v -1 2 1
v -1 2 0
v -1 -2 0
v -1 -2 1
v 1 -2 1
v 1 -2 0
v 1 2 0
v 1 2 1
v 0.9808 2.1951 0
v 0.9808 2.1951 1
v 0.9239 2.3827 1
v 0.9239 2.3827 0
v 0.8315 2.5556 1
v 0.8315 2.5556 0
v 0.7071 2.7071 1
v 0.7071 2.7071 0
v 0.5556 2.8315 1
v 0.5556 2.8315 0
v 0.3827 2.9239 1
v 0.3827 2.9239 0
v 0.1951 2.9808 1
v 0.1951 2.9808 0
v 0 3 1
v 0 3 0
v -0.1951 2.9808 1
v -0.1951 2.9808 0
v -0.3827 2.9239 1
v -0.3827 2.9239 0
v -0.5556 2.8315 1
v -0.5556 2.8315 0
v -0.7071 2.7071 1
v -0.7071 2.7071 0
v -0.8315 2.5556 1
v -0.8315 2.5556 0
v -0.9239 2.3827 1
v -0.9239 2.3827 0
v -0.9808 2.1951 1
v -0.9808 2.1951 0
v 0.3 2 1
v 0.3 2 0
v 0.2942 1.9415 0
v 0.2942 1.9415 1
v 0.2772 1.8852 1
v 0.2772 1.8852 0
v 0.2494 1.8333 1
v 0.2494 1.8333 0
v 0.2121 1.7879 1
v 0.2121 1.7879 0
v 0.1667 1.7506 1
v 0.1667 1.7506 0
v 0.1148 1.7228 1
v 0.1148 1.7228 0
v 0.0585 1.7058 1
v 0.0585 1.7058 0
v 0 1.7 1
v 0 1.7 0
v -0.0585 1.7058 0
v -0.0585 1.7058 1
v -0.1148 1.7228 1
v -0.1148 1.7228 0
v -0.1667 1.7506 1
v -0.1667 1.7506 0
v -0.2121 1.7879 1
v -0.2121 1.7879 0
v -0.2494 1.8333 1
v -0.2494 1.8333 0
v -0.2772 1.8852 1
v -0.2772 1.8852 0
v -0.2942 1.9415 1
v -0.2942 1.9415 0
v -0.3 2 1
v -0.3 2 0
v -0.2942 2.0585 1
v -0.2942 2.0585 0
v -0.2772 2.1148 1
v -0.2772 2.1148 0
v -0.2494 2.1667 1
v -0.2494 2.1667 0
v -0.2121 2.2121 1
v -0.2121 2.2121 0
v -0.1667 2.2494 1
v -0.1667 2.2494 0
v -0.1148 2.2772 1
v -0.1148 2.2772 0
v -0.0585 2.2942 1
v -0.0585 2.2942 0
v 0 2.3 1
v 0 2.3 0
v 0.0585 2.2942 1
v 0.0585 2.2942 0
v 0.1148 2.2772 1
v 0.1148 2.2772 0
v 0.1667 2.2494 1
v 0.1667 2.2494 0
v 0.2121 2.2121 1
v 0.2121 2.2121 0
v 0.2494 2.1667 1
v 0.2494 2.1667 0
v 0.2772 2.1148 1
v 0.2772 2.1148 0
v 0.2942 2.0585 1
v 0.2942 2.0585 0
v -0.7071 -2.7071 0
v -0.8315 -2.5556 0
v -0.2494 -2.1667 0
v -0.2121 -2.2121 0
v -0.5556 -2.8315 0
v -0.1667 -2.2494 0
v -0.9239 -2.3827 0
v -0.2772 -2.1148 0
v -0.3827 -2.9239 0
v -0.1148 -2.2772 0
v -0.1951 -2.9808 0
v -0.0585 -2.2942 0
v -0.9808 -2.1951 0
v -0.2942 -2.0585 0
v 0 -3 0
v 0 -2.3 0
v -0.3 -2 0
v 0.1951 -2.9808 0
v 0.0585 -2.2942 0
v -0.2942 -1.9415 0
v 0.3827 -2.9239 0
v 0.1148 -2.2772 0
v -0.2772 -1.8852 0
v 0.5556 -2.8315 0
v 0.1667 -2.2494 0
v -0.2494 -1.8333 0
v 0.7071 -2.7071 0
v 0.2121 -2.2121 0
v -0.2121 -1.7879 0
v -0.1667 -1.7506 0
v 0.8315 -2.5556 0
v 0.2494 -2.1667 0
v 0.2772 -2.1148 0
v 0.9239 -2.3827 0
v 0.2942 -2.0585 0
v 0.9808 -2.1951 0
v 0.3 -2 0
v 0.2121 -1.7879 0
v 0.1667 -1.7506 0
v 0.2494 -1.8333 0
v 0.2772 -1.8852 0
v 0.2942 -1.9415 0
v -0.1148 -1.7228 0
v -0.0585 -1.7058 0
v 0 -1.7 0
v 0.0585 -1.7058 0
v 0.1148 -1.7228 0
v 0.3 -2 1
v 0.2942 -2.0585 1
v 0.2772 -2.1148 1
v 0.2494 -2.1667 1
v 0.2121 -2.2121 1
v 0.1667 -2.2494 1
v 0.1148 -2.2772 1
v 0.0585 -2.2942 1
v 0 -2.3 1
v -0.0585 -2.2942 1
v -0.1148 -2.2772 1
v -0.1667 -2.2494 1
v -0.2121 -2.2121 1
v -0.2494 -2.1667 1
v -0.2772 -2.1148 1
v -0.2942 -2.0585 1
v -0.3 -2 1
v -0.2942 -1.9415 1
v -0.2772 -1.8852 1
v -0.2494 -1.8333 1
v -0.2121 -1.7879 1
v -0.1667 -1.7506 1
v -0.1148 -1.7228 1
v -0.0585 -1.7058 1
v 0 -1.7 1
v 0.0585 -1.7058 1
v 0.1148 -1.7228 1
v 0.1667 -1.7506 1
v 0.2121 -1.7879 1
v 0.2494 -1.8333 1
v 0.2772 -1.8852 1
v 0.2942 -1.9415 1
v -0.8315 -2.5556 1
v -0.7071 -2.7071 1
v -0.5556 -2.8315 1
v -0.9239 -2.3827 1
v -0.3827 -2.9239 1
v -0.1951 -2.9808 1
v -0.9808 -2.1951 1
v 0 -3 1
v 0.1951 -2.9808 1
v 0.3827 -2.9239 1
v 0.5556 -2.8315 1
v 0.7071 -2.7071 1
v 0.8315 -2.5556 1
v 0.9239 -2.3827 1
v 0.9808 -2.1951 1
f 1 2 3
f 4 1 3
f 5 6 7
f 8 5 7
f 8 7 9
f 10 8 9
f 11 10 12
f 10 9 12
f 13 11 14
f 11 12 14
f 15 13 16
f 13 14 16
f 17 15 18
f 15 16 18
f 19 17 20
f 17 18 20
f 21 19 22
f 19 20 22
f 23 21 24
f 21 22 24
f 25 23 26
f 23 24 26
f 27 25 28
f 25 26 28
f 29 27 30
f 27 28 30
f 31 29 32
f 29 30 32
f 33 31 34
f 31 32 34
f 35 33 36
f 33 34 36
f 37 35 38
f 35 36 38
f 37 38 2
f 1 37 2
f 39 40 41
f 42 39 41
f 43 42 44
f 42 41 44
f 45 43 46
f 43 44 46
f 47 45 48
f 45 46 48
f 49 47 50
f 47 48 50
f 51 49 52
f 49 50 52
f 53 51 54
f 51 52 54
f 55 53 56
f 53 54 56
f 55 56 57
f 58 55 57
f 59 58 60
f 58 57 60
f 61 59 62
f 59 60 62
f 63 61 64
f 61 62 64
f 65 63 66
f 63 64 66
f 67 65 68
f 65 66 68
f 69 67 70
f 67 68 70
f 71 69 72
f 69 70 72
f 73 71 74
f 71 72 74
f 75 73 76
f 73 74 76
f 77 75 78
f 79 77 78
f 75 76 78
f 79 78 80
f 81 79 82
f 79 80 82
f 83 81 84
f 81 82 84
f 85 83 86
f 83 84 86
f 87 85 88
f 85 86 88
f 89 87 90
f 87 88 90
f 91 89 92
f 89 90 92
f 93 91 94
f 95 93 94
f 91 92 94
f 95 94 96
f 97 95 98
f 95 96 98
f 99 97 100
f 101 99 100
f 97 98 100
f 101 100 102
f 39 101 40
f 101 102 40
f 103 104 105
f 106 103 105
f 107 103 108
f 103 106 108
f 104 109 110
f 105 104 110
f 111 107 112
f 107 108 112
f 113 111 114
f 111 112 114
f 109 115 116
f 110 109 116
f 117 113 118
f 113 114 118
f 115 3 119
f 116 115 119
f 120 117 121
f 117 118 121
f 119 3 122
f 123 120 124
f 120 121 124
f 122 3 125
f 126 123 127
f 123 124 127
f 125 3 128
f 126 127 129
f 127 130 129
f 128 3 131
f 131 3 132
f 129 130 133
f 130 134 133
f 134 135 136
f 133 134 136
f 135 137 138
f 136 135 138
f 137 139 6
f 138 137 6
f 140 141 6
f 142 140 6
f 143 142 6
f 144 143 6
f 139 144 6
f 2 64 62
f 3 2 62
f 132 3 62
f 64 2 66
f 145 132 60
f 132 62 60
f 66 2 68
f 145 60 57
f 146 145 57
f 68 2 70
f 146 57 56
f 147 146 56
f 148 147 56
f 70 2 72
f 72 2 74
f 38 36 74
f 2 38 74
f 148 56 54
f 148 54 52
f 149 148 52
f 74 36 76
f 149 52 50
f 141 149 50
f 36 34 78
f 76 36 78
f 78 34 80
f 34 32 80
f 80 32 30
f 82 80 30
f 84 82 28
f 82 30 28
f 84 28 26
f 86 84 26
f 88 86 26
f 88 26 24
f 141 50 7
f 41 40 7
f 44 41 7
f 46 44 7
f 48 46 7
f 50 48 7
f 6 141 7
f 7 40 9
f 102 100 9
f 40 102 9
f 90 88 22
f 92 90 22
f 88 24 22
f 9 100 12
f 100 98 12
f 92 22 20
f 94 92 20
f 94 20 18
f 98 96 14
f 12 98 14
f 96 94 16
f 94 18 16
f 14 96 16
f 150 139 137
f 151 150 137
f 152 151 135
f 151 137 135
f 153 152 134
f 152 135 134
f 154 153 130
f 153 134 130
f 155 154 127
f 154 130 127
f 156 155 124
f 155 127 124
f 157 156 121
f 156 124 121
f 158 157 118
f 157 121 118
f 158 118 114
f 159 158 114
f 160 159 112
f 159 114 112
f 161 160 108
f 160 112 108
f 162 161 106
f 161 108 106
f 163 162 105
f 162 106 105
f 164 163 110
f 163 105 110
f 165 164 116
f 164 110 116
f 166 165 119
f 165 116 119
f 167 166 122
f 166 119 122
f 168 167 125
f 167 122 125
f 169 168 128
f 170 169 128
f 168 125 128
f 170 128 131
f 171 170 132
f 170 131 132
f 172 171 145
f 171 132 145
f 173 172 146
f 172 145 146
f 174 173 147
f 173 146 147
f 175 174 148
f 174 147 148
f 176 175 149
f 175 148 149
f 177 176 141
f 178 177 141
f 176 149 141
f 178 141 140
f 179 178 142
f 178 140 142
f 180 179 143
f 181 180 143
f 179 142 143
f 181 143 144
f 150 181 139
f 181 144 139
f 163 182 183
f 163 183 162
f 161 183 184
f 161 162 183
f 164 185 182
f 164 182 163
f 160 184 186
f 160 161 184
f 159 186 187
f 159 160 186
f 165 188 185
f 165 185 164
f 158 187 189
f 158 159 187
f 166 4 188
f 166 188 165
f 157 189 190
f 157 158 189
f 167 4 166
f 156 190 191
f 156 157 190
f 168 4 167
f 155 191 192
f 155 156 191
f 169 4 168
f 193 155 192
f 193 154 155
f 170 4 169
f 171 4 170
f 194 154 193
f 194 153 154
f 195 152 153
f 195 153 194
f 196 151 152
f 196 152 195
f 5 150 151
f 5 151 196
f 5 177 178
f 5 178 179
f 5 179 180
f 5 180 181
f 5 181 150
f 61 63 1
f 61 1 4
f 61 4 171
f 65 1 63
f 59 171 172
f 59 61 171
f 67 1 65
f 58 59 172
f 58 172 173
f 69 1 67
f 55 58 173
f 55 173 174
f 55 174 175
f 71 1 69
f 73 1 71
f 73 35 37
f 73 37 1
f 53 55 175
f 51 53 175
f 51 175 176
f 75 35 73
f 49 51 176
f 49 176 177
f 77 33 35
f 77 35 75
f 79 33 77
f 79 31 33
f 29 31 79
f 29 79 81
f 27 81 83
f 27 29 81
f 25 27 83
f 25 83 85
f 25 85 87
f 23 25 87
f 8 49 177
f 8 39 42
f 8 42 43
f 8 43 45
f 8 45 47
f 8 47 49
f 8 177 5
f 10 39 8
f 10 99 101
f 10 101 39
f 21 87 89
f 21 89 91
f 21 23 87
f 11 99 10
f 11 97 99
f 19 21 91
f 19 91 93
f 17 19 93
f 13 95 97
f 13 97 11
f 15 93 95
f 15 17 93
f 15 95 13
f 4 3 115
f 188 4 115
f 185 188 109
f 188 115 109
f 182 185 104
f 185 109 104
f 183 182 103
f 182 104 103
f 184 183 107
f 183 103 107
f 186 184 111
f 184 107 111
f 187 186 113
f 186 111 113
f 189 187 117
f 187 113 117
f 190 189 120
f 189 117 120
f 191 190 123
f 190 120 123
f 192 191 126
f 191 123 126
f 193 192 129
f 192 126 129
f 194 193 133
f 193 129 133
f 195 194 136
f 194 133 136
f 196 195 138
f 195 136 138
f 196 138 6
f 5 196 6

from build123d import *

# Parameters (mm, degrees)
EXTRUDE_1_DEPTH = 1


with BuildPart() as part:
    # 草图1 → 凸台-拉伸1 (new body)
    with BuildSketch(Plane.XY):
        with BuildLine():
            ThreePointArc((-0.3, 2), (0, 2.3), (0.3, 2))
            Line((0.3, 2), (1, 2))
            ThreePointArc((1, 2), (0, 3), (-1, 2))
            Line((-1, 2), (-0.3, 2))
        make_face()
        with BuildLine():
            Line((1, 2), (0.3, 2))
            ThreePointArc((0.3, 2), (0, 1.7), (-0.3, 2))
            Line((-0.3, 2), (-1, 2))
            ThreePointArc((-1, 2), (0, 1), (1, 2))
        make_face()
        with BuildLine():
            Line((1, -2), (1, 2))
            ThreePointArc((1, 2), (0, 1), (-1, 2))
            Line((-1, 2), (-1, -2))
            ThreePointArc((-1, -2), (0, -1), (1, -2))
        make_face()
        with BuildLine():
            ThreePointArc((-1, -2), (0, -3), (1, -2))
            Line((1, -2), (0.3, -2))
            ThreePointArc((0.3, -2), (0, -2.3), (-0.3, -2))
            Line((-0.3, -2), (-1, -2))
        make_face()
        with BuildLine():
            Line((0.3, -2), (1, -2))
            ThreePointArc((1, -2), (0, -1), (-1, -2))
            Line((-1, -2), (-0.3, -2))
            ThreePointArc((-0.3, -2), (0, -1.7), (0.3, -2))
        make_face()
    extrude(amount=EXTRUDE_1_DEPTH)


solid = part.part
